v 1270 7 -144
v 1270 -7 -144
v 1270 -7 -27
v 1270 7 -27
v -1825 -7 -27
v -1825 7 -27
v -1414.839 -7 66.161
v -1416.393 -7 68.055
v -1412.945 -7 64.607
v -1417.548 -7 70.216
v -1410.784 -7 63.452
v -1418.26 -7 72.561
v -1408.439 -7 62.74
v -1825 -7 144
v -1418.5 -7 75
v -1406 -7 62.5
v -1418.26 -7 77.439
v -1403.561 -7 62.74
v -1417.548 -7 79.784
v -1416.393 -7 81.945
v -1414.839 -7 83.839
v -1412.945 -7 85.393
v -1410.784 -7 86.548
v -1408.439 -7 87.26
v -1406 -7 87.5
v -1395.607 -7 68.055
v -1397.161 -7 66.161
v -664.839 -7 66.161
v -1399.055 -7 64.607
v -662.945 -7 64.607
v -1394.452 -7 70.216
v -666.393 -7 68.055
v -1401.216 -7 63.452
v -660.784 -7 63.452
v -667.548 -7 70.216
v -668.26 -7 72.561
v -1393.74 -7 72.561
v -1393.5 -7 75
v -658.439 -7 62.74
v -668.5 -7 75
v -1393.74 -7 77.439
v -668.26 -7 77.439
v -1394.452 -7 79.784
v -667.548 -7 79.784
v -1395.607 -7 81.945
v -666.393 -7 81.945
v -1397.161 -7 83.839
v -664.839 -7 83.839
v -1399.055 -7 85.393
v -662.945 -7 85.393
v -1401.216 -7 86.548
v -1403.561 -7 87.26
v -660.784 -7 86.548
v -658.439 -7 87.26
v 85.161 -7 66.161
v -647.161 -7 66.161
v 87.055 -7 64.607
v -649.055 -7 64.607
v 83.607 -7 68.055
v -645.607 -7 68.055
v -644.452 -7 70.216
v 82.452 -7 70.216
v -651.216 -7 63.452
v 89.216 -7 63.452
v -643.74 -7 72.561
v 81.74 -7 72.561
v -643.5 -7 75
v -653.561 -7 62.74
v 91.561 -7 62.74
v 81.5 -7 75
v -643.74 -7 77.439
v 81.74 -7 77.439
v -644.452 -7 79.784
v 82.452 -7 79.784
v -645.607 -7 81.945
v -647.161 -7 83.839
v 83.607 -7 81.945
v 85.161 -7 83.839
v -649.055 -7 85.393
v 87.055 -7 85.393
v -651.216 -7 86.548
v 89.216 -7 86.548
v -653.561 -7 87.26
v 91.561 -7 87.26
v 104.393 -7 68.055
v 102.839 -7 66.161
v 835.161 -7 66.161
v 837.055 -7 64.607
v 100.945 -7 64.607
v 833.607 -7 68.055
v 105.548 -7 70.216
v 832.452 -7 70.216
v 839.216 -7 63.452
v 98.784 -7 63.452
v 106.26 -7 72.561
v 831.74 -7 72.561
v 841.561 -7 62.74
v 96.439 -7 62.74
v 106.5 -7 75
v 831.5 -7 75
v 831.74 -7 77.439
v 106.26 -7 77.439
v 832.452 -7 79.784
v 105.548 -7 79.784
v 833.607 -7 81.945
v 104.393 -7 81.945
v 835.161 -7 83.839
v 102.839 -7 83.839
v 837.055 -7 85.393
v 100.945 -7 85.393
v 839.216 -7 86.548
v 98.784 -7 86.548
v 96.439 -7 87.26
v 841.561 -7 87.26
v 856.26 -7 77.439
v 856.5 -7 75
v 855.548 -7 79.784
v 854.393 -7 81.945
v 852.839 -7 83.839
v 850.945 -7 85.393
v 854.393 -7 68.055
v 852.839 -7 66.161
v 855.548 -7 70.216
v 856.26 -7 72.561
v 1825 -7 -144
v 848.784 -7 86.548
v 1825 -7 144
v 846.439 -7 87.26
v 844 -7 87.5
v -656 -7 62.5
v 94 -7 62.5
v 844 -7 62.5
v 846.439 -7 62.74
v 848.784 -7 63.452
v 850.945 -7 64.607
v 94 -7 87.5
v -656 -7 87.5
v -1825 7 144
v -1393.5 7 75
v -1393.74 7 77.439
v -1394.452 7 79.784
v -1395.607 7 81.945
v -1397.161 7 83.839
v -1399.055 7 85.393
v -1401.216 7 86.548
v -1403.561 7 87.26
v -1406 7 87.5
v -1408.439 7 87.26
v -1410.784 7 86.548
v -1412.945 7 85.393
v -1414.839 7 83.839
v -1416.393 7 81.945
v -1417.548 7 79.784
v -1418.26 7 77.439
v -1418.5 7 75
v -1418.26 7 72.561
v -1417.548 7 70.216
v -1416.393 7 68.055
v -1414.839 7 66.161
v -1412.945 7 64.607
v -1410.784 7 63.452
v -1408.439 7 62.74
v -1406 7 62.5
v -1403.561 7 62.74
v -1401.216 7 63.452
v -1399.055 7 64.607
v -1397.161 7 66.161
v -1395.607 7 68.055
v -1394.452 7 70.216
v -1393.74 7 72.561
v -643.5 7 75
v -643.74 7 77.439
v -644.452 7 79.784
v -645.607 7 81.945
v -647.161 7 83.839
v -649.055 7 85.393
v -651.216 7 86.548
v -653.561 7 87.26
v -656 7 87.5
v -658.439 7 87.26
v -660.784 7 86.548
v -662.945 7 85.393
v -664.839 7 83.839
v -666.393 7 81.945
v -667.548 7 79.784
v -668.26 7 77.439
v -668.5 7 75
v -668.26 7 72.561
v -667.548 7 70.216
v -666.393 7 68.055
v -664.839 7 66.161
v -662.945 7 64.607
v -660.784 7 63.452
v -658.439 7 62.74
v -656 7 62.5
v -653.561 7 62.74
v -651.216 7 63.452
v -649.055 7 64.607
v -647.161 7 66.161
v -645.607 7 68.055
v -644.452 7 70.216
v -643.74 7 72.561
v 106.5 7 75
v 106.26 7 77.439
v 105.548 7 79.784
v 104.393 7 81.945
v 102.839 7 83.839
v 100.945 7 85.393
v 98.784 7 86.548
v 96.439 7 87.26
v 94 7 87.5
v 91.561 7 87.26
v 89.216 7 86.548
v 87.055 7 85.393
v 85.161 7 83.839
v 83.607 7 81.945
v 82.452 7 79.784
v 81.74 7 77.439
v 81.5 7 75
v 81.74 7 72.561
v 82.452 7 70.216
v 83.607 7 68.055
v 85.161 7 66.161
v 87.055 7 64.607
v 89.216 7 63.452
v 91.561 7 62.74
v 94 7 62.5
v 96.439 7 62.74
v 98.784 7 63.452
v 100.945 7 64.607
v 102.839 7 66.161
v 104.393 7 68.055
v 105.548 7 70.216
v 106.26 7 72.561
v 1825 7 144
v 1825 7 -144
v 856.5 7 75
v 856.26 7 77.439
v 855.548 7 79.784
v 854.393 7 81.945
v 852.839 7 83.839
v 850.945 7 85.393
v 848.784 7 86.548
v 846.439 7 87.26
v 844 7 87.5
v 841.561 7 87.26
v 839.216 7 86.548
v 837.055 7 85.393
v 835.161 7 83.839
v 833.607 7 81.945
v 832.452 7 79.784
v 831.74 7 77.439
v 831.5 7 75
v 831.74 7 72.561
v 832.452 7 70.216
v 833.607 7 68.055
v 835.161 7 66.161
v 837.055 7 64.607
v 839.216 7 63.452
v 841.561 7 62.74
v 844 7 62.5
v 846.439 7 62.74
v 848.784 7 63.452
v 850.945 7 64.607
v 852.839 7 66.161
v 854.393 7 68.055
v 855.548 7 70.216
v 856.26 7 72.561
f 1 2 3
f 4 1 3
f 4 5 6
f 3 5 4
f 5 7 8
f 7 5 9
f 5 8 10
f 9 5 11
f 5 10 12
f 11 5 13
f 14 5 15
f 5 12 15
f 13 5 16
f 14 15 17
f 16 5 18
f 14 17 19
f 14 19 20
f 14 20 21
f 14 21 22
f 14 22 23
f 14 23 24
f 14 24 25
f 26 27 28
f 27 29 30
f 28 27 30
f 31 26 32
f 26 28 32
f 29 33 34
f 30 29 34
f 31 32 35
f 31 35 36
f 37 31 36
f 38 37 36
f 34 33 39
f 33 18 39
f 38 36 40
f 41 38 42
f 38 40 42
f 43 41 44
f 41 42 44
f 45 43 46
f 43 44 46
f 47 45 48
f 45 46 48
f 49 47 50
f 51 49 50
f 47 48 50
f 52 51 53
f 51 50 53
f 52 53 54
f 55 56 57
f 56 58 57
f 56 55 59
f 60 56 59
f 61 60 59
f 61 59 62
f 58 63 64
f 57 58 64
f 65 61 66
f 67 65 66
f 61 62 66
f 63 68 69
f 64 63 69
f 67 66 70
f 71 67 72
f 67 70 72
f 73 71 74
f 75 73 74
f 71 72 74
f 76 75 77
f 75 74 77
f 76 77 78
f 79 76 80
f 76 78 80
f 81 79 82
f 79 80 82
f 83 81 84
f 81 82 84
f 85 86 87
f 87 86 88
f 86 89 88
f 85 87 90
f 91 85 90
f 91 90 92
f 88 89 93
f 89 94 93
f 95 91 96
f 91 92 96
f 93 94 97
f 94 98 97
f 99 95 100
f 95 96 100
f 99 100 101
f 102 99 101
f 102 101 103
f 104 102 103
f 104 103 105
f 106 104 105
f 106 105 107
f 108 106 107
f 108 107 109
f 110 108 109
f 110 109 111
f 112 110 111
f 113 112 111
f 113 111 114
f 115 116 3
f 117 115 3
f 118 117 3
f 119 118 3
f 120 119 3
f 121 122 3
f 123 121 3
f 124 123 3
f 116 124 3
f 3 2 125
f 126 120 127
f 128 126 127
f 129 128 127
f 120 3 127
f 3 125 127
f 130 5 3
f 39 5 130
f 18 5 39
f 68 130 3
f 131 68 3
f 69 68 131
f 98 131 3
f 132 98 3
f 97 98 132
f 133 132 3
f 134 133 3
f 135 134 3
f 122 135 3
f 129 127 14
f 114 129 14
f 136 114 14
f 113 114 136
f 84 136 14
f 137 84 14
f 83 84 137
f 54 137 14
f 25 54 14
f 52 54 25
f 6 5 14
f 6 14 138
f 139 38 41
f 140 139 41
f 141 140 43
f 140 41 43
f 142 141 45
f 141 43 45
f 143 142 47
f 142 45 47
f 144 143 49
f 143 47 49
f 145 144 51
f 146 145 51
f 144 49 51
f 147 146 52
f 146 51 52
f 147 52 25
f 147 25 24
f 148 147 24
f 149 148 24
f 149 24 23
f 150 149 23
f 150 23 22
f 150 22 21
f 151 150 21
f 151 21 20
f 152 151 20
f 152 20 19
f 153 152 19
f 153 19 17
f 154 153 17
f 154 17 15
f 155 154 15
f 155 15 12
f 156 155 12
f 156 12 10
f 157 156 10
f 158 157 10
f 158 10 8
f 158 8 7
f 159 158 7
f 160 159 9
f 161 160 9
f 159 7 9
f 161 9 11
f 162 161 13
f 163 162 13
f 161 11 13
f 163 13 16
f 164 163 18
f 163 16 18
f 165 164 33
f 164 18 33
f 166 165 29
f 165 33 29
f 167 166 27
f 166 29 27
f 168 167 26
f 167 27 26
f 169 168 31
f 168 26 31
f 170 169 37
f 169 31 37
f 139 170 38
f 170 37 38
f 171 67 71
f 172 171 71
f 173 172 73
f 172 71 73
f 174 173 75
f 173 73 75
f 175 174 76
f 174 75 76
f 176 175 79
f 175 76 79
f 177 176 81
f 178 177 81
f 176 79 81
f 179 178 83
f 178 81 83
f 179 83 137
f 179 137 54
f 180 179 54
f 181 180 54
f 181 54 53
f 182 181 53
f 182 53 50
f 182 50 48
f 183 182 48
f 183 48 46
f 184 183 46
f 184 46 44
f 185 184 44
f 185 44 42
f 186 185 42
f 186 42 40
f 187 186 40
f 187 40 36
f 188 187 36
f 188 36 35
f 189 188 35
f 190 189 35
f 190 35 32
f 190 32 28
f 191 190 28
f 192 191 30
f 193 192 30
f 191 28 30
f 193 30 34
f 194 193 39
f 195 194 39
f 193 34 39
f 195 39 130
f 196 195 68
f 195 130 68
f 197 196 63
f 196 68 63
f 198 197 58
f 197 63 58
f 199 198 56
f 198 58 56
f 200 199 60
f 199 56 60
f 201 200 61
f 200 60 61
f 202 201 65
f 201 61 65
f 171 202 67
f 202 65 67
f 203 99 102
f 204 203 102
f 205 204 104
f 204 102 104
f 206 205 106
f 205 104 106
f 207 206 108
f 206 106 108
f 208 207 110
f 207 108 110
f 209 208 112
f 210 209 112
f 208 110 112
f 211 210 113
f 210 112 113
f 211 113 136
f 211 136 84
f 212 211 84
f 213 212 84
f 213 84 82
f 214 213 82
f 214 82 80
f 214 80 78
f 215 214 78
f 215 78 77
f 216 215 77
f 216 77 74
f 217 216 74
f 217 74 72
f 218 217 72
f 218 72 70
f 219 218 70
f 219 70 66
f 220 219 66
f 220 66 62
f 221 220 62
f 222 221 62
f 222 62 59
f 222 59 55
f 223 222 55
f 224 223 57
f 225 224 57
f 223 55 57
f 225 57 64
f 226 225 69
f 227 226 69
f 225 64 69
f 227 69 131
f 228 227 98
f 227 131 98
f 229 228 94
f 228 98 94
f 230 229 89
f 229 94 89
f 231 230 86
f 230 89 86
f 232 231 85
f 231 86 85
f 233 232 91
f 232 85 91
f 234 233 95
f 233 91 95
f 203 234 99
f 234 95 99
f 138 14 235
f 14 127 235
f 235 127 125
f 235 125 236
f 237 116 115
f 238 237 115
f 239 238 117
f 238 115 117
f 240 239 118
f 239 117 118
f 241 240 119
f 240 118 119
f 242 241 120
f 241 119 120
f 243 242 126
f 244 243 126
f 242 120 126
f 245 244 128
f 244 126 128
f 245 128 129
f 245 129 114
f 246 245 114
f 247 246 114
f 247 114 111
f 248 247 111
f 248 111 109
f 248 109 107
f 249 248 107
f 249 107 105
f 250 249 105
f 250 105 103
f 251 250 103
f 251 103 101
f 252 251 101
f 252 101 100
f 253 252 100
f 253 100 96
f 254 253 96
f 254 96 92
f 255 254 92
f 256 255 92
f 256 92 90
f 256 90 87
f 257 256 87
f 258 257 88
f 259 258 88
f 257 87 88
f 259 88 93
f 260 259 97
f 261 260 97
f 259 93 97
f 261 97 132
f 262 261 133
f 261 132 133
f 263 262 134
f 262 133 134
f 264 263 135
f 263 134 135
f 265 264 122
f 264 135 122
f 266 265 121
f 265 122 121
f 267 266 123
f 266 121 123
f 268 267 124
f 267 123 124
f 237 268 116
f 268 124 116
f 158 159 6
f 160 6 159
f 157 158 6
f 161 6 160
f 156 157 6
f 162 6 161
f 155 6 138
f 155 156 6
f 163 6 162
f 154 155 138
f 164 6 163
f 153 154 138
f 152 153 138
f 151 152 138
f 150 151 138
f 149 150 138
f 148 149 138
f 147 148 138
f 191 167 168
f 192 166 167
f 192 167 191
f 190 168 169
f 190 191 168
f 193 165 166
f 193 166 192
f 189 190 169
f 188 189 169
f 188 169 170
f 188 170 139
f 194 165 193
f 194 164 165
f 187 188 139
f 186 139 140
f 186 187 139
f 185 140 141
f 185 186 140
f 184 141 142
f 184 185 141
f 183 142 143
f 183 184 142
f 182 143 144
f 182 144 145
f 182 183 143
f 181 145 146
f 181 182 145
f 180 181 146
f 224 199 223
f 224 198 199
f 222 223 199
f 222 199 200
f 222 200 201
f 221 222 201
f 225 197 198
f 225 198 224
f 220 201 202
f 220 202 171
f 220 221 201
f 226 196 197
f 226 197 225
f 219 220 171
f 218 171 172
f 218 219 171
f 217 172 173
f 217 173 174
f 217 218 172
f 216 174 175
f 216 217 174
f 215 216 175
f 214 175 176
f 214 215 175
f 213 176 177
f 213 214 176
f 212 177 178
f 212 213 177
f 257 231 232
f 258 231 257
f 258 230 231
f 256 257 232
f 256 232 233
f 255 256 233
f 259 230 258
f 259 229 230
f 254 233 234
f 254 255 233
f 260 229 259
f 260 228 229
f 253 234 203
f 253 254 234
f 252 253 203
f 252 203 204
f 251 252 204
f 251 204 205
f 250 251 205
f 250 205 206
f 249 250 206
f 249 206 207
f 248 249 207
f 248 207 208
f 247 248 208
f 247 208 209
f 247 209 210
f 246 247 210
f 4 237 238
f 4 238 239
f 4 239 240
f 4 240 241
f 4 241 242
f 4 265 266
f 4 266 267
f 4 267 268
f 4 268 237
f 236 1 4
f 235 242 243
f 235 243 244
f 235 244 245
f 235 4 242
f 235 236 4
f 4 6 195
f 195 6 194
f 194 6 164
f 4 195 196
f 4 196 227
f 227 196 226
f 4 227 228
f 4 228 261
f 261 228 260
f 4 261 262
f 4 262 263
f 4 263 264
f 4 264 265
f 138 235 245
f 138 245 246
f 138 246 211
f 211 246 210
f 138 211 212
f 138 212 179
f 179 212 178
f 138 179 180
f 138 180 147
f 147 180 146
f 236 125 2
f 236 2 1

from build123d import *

# Parameters (mm, degrees)
F0_W     = 14
F0_H     = 288
F1_DEPTH = 1825
F2_W     = 3095
F2_H     = 117
F3_DEPTH = 25
F4_R     = 12.5
F5_DEPTH = 25


with BuildPart() as f1:
    # F0 (on Right) → F1 (new body, symmetric)
    with BuildSketch(Plane.YZ):
        Rectangle(F0_W, F0_H)
    extrude(amount=F1_DEPTH, both=True)

    # F2 (on face) → F3 (cut)
    with BuildSketch(Plane.XZ.offset(7)):
        with Locations((-277.5, -85.5)):
            Rectangle(F2_W, F2_H)
    extrude(amount=-F3_DEPTH, mode=Mode.SUBTRACT)

    # F4 (on face) → F5 (cut)
    with BuildSketch(Plane.XZ.offset(7)):
        with Locations((-1406, 75)):
            Circle(F4_R)
        with Locations((-656, 75)):
            Circle(F4_R)
        with Locations((94, 75)):
            Circle(F4_R)
        with Locations((844, 75)):
            Circle(F4_R)
    extrude(amount=-F5_DEPTH, mode=Mode.SUBTRACT)


solid = f1.part
